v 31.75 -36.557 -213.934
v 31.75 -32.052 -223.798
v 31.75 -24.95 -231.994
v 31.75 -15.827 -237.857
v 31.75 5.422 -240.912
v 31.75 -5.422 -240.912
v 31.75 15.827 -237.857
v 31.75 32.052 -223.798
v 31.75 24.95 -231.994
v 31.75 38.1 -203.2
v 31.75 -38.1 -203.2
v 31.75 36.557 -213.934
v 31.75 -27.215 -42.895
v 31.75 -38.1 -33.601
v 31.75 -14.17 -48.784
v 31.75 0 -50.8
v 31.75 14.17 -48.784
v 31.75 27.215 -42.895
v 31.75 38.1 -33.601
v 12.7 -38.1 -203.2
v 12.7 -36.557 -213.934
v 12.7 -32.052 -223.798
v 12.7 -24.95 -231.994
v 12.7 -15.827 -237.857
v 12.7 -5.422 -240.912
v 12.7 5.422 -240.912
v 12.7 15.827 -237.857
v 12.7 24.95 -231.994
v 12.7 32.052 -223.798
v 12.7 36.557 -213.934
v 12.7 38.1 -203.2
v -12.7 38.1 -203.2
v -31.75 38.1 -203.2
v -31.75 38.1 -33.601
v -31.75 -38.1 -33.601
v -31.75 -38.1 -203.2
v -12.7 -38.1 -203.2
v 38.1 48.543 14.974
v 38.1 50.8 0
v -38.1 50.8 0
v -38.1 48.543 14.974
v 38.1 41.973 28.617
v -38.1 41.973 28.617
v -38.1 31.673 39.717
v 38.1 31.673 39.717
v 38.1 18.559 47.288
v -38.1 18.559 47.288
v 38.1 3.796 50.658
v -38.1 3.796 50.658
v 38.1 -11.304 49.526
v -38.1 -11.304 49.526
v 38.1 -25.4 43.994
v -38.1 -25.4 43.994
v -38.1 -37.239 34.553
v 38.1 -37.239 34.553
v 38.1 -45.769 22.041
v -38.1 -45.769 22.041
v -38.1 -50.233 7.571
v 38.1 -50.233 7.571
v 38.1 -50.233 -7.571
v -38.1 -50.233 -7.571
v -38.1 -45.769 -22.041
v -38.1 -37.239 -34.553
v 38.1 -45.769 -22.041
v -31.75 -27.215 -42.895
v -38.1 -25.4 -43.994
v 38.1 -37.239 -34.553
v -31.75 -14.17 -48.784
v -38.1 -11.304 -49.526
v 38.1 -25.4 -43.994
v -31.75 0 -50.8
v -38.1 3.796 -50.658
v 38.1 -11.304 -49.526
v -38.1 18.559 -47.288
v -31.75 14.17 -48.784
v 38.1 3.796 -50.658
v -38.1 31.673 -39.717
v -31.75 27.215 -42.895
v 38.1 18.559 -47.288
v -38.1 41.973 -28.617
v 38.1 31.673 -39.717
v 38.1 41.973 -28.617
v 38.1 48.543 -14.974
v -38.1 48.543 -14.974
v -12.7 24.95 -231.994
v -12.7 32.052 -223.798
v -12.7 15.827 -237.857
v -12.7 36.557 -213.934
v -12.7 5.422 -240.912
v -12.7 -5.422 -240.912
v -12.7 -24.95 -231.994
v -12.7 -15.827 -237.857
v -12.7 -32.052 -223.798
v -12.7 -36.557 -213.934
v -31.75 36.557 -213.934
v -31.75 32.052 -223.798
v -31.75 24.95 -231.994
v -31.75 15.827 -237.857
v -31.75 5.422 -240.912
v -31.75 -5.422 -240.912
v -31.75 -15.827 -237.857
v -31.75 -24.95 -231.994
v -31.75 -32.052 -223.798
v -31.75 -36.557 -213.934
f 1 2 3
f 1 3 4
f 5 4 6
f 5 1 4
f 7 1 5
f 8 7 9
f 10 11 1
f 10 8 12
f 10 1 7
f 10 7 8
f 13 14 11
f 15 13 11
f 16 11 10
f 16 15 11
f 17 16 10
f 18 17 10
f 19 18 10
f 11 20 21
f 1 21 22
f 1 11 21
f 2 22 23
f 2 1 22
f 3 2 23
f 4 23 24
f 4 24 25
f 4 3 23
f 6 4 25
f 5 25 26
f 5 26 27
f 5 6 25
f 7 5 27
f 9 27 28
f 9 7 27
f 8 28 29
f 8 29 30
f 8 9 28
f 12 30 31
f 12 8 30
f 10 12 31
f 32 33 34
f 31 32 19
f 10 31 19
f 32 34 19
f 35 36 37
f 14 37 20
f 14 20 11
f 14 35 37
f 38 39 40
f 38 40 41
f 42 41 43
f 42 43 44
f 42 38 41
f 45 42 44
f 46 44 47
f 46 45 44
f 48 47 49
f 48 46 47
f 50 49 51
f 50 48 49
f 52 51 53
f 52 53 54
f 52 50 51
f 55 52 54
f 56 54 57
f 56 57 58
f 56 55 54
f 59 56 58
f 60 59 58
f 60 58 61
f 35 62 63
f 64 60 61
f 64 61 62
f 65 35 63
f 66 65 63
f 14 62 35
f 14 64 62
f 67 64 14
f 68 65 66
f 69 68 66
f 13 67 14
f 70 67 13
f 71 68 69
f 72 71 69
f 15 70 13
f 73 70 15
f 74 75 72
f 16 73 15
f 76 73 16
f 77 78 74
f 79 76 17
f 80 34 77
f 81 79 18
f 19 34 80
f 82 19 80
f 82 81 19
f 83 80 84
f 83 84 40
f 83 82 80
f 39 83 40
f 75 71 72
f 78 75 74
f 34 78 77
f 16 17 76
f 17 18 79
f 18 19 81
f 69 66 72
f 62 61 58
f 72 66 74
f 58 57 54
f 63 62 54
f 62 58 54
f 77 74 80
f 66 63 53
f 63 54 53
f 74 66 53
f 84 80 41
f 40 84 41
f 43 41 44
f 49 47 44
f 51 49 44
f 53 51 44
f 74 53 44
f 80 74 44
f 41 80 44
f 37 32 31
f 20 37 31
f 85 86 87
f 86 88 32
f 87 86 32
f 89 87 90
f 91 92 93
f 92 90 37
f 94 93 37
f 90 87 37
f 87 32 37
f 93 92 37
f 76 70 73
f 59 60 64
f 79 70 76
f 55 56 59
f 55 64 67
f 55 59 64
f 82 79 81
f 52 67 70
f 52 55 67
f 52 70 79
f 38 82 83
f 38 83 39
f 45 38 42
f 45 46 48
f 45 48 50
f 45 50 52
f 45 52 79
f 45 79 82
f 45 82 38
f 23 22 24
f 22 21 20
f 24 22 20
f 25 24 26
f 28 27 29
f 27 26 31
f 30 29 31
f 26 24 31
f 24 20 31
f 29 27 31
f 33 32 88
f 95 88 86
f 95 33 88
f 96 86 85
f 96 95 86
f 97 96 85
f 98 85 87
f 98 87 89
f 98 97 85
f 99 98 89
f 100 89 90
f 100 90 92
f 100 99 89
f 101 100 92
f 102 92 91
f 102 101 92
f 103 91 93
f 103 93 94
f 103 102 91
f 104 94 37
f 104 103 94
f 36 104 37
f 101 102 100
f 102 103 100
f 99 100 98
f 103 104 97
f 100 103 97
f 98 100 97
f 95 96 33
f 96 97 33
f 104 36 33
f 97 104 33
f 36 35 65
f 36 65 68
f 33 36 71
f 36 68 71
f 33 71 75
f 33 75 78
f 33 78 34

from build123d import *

# Parameters (mm, degrees)
F0_R     = 50.8
F1_DEPTH = 38.1
F2_W     = 63.5
F2_H     = 76.2
F3_DEPTH = 203.2
F4_R     = 38.1
F5_DEPTH = 19.05
F6_R     = 38.1
F7_DEPTH = 19.05


with BuildPart() as f1:
    # F0 (on Right) → F1 (new body, symmetric)
    with BuildSketch(Plane.YZ):
        Circle(F0_R)
    extrude(amount=F1_DEPTH, both=True)

    # F2 (on Top) → F3 (join)
    with BuildSketch(Plane.XY):
        Rectangle(F2_W, F2_H)
    extrude(amount=-F3_DEPTH)

    # F4 (on face) → F5 (join)
    with BuildSketch(Plane(origin=(-31.75, 0, 0), x_dir=(0, -1, 0), z_dir=(-1, 0, 0))):
        with Locations((0, -203.2)):
            Circle(F4_R)
    extrude(amount=-F5_DEPTH)

    # F6 (on face) → F7 (join)
    with BuildSketch(Plane.YZ.offset(31.75)):
        with Locations((0, -203.2)):
            Circle(F6_R)
    extrude(amount=-F7_DEPTH)


solid = f1.part
